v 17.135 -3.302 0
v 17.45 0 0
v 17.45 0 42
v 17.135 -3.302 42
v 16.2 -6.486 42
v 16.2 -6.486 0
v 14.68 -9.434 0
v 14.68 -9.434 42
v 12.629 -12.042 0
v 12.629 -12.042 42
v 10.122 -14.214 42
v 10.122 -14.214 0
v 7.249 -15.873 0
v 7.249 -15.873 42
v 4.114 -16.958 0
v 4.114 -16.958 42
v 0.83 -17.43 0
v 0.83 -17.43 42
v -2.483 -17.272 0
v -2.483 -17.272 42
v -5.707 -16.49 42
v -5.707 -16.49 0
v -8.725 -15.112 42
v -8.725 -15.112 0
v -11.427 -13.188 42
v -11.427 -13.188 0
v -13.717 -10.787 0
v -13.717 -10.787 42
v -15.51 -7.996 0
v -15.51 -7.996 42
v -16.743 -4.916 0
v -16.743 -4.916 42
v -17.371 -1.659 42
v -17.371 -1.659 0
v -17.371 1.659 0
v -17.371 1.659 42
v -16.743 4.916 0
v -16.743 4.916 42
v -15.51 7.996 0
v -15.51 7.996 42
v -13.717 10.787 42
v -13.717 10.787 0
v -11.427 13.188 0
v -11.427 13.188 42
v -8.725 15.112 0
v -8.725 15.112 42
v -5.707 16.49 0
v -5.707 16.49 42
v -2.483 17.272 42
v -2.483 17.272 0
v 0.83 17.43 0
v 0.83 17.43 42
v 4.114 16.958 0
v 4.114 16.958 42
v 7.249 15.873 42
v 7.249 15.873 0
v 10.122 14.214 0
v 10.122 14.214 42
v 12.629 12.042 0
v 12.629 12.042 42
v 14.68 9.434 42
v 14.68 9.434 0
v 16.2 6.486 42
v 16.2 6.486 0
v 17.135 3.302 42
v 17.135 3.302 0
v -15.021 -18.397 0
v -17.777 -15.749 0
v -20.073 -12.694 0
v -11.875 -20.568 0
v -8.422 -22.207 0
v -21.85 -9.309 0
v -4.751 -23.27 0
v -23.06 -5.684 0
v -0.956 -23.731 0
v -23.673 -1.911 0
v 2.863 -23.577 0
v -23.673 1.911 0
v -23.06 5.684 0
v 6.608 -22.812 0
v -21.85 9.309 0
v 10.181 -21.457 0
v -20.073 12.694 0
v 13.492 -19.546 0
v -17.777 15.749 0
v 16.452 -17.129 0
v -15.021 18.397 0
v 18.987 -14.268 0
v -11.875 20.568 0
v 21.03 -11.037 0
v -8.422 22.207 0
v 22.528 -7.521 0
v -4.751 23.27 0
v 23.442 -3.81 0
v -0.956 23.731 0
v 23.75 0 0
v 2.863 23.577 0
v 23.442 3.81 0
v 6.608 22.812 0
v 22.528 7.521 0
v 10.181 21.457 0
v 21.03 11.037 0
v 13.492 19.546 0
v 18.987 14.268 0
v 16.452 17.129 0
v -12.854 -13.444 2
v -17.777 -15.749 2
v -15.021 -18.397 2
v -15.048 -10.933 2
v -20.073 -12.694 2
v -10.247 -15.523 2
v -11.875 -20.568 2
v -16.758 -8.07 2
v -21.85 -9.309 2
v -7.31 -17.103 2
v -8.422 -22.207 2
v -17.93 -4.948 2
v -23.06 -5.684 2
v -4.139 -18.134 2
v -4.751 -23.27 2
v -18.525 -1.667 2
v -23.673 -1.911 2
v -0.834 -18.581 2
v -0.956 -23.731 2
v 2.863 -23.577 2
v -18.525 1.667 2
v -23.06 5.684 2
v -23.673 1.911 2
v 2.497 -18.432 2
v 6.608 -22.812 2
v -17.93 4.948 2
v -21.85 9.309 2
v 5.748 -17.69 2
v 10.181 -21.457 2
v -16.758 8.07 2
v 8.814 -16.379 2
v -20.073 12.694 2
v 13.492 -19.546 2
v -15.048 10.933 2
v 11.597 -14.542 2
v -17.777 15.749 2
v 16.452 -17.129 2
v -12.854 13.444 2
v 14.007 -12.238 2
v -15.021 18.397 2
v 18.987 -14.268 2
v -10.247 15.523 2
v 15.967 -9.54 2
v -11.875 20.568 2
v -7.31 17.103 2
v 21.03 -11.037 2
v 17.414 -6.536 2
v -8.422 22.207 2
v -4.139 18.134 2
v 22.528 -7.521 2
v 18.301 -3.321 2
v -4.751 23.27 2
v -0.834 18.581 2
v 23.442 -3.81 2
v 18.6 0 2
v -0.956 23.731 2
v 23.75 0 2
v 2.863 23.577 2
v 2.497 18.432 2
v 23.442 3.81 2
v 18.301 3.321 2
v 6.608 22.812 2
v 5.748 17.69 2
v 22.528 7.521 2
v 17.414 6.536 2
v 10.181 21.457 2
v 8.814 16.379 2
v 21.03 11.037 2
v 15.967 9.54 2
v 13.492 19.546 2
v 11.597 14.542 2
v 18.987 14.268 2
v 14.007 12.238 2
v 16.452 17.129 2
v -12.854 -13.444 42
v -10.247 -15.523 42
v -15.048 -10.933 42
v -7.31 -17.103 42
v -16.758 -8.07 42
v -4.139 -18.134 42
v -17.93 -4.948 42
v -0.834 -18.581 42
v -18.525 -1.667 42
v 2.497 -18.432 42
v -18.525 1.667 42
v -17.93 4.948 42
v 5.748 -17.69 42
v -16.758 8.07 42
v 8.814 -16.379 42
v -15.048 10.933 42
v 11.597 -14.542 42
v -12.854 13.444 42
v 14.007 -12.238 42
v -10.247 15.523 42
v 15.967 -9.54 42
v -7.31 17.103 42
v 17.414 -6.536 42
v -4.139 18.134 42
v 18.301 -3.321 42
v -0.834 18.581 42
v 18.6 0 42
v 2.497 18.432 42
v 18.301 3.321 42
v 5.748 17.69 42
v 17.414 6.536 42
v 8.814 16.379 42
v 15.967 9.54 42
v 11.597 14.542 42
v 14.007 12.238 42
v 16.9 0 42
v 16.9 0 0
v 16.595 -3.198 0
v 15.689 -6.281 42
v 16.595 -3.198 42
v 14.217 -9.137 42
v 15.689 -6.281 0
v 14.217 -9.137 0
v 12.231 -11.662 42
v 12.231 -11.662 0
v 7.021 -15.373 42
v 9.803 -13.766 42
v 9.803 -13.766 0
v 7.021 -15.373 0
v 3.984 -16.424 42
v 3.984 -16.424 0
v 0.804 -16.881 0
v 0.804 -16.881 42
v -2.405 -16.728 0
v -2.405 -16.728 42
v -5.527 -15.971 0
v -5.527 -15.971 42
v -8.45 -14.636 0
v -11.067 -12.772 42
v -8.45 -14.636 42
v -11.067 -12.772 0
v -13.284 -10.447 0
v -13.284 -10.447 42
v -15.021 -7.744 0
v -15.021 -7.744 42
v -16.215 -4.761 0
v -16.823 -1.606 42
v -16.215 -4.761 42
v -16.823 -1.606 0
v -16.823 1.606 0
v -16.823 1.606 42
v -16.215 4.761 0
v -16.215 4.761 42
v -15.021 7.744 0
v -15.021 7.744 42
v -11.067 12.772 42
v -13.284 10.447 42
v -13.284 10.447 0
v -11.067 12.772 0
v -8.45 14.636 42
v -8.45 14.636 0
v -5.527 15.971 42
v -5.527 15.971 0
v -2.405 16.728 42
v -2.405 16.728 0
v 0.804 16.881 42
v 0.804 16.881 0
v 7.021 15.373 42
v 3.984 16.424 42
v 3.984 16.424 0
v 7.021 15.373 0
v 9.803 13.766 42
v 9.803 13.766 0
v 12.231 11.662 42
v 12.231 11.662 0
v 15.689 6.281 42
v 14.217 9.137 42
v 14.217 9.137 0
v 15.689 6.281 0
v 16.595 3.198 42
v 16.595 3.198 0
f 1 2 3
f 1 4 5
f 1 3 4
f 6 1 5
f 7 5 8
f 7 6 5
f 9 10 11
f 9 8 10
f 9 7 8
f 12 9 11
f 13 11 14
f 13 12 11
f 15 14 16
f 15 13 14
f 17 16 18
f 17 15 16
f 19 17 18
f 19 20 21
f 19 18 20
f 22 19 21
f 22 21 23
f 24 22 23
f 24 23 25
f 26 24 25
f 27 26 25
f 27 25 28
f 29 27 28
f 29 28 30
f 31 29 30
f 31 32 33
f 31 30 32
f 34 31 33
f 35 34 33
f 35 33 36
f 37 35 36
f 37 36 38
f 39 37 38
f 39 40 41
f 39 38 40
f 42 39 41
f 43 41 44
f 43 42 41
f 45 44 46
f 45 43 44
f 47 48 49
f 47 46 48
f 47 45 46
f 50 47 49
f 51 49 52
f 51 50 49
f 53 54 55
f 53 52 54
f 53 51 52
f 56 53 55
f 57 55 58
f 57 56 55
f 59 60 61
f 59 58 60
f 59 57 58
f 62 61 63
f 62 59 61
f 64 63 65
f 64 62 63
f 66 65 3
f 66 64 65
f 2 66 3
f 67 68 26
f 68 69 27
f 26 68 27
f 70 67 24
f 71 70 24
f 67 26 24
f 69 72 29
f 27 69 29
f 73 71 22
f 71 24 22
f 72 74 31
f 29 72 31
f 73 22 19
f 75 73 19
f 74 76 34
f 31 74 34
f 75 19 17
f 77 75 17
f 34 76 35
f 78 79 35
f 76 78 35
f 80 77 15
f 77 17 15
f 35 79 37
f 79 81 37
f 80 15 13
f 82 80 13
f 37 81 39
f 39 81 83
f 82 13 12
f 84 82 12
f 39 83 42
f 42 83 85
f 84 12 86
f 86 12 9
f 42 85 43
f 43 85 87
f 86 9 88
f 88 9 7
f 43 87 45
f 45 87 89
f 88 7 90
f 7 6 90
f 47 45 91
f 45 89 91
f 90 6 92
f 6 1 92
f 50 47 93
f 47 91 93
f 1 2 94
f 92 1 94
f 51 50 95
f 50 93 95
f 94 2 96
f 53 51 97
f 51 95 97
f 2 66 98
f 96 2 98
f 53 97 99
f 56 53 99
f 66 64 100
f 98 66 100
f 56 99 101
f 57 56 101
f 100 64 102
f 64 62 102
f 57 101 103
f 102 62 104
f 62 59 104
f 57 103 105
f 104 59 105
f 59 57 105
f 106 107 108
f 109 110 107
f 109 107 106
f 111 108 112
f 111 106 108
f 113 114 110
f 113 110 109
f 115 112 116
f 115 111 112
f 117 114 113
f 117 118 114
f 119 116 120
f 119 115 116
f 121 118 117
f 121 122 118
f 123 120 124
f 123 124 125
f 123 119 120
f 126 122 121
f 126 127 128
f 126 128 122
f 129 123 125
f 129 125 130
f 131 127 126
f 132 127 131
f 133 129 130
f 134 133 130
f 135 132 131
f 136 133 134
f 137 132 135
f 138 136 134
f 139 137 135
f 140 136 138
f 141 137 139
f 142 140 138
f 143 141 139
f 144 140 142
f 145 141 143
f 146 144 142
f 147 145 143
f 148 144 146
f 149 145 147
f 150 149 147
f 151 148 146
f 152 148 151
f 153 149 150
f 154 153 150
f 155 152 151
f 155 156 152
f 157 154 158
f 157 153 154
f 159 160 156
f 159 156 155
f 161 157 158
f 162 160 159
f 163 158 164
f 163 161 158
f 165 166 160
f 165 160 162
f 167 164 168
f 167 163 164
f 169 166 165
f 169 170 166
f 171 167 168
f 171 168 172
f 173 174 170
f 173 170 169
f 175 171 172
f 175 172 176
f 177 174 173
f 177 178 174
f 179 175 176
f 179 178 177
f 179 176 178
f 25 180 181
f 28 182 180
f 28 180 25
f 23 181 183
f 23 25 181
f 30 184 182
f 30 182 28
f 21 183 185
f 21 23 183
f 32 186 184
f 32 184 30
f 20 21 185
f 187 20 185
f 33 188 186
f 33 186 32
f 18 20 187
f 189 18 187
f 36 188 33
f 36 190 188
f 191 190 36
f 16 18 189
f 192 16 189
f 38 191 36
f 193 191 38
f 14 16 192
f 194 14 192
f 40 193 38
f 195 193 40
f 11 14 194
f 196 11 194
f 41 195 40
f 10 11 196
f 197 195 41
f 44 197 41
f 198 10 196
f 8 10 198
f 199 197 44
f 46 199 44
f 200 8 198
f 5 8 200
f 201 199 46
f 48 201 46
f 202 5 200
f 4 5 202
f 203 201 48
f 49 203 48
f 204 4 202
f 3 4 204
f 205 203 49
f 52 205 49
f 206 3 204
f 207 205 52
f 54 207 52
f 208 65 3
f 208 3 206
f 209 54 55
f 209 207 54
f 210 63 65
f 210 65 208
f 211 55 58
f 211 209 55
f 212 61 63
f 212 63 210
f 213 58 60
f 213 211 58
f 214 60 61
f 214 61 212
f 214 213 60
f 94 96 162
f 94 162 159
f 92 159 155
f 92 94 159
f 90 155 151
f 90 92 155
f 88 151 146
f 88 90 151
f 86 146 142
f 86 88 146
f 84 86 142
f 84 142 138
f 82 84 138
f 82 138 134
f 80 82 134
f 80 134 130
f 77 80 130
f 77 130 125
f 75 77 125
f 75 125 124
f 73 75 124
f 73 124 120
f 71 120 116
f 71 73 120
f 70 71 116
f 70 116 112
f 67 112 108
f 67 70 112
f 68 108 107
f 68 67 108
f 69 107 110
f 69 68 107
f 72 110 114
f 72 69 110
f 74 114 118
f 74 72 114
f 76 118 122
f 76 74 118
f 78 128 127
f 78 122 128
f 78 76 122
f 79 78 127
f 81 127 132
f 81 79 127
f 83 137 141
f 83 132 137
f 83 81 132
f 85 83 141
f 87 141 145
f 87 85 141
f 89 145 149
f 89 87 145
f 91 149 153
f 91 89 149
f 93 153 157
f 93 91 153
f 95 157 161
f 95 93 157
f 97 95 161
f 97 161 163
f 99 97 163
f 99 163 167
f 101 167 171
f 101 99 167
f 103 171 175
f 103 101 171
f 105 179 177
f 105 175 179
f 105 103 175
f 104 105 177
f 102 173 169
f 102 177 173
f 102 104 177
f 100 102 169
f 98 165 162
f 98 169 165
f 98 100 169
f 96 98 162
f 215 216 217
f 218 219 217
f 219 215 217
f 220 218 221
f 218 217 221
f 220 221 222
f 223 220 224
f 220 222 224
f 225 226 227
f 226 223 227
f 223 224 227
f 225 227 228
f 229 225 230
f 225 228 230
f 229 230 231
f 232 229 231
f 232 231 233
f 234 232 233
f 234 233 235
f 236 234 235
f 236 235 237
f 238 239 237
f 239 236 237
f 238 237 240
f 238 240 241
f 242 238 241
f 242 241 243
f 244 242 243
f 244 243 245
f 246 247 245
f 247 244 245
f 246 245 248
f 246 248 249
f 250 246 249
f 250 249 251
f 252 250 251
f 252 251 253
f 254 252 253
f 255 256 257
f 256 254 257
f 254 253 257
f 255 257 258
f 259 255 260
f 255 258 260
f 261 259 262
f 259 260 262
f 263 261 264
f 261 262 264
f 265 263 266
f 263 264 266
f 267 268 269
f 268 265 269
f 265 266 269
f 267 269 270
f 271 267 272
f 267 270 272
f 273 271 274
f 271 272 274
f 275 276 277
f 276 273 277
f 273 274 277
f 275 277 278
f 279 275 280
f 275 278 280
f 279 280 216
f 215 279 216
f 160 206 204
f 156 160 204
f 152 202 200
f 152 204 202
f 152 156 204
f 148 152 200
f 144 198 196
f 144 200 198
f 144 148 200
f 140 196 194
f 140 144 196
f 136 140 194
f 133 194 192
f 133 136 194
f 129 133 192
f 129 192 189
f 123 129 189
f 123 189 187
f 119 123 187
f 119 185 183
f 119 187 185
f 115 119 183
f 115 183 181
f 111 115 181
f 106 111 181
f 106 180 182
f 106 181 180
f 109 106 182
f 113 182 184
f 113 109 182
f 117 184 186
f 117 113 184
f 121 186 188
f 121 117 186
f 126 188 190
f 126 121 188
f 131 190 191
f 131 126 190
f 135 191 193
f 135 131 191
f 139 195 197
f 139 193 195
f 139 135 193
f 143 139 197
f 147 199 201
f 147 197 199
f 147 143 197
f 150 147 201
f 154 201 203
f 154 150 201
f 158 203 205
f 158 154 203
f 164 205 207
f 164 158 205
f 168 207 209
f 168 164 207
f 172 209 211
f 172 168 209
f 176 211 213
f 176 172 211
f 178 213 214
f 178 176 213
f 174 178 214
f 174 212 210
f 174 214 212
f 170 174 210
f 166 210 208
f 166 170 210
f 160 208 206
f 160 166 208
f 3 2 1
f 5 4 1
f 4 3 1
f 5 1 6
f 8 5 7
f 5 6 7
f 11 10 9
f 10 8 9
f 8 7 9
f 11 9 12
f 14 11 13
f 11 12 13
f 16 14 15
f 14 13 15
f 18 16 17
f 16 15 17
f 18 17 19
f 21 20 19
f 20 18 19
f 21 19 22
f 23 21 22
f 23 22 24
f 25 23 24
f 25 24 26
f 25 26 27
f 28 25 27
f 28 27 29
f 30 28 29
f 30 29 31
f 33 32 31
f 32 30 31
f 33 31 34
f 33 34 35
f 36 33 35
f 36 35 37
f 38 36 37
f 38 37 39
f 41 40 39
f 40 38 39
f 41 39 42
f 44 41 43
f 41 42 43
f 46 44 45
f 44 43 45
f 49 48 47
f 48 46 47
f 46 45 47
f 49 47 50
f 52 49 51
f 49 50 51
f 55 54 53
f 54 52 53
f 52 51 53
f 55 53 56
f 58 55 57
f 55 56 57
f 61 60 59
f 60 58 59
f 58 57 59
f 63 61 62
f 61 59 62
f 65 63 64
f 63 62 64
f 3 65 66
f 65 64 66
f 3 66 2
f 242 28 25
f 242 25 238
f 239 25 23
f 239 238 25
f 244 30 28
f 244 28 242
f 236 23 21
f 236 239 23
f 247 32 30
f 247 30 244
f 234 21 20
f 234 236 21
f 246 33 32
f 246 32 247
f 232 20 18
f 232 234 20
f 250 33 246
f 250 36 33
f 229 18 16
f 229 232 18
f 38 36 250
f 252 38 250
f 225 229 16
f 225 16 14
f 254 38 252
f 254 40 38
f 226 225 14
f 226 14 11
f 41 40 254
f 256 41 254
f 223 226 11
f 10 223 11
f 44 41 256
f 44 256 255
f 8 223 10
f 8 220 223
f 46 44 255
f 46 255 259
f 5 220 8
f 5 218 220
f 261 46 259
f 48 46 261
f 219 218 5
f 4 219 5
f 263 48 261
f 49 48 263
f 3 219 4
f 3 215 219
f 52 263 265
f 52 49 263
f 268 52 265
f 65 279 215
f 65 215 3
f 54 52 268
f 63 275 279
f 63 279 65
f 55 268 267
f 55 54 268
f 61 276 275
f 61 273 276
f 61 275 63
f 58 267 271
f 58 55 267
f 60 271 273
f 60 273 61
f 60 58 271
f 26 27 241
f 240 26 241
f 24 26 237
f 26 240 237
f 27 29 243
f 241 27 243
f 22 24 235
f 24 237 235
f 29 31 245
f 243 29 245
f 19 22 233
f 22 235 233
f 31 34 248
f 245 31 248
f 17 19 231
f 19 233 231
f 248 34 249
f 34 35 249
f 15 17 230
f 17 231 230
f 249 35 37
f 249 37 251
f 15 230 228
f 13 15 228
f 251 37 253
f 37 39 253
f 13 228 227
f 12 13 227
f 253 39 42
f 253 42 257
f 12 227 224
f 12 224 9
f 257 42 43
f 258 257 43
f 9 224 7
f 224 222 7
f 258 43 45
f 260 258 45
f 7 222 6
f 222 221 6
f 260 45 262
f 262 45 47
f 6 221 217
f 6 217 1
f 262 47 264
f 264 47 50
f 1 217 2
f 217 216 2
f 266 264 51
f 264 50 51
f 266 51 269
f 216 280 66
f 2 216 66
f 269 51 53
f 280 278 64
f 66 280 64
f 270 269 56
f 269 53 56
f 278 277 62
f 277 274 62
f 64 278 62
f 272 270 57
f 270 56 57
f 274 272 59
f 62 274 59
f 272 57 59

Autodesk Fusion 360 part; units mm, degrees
sketch "Sketch1" plane through (0, 0, 0) normal (0, 0, 1) x (1, 0, 0)
  circle A0 centre (0, 0) radius 17.45
  circle A1 centre (0, 0) radius 18.6
  circle A2 centre (0, 0) radius 23.75
  dimension "d1" = 34.9
  dimension "d2" = 37.2
  dimension "d3" = 47.5
extrude "Extrude1" add sketch "Sketch1" along normal blind 42 contours A1 makes body 1
extrude "Extrude2" add sketch "Sketch1" along normal blind 2 contours A2 bodies 1
sketch "Sketch1 (2)" plane through (0, 0, 0) normal (0, 0, 1) x (1, 0, 0) in component "pipe-added-ID"
  circle A0 centre (0, 0) radius 16.9
  circle A1 centre (0, 0) radius 17.45
  circle A2 centre (0, 0) radius 18.6
  circle A3 centre (0, 0) radius 17.45
  dimension "d8" = 33.8
extrude "Extrude1'" add sketch "Sketch1 (2)" along normal up to surface (42 mm away) separate body contours A1 A3 makes body 2 in component "pipe-added-ID"
component "pipe-added-ID" placed x (1, 0, 0) y (0, 1, 0) z (0, 0, 1) at (0, 0, 0)
